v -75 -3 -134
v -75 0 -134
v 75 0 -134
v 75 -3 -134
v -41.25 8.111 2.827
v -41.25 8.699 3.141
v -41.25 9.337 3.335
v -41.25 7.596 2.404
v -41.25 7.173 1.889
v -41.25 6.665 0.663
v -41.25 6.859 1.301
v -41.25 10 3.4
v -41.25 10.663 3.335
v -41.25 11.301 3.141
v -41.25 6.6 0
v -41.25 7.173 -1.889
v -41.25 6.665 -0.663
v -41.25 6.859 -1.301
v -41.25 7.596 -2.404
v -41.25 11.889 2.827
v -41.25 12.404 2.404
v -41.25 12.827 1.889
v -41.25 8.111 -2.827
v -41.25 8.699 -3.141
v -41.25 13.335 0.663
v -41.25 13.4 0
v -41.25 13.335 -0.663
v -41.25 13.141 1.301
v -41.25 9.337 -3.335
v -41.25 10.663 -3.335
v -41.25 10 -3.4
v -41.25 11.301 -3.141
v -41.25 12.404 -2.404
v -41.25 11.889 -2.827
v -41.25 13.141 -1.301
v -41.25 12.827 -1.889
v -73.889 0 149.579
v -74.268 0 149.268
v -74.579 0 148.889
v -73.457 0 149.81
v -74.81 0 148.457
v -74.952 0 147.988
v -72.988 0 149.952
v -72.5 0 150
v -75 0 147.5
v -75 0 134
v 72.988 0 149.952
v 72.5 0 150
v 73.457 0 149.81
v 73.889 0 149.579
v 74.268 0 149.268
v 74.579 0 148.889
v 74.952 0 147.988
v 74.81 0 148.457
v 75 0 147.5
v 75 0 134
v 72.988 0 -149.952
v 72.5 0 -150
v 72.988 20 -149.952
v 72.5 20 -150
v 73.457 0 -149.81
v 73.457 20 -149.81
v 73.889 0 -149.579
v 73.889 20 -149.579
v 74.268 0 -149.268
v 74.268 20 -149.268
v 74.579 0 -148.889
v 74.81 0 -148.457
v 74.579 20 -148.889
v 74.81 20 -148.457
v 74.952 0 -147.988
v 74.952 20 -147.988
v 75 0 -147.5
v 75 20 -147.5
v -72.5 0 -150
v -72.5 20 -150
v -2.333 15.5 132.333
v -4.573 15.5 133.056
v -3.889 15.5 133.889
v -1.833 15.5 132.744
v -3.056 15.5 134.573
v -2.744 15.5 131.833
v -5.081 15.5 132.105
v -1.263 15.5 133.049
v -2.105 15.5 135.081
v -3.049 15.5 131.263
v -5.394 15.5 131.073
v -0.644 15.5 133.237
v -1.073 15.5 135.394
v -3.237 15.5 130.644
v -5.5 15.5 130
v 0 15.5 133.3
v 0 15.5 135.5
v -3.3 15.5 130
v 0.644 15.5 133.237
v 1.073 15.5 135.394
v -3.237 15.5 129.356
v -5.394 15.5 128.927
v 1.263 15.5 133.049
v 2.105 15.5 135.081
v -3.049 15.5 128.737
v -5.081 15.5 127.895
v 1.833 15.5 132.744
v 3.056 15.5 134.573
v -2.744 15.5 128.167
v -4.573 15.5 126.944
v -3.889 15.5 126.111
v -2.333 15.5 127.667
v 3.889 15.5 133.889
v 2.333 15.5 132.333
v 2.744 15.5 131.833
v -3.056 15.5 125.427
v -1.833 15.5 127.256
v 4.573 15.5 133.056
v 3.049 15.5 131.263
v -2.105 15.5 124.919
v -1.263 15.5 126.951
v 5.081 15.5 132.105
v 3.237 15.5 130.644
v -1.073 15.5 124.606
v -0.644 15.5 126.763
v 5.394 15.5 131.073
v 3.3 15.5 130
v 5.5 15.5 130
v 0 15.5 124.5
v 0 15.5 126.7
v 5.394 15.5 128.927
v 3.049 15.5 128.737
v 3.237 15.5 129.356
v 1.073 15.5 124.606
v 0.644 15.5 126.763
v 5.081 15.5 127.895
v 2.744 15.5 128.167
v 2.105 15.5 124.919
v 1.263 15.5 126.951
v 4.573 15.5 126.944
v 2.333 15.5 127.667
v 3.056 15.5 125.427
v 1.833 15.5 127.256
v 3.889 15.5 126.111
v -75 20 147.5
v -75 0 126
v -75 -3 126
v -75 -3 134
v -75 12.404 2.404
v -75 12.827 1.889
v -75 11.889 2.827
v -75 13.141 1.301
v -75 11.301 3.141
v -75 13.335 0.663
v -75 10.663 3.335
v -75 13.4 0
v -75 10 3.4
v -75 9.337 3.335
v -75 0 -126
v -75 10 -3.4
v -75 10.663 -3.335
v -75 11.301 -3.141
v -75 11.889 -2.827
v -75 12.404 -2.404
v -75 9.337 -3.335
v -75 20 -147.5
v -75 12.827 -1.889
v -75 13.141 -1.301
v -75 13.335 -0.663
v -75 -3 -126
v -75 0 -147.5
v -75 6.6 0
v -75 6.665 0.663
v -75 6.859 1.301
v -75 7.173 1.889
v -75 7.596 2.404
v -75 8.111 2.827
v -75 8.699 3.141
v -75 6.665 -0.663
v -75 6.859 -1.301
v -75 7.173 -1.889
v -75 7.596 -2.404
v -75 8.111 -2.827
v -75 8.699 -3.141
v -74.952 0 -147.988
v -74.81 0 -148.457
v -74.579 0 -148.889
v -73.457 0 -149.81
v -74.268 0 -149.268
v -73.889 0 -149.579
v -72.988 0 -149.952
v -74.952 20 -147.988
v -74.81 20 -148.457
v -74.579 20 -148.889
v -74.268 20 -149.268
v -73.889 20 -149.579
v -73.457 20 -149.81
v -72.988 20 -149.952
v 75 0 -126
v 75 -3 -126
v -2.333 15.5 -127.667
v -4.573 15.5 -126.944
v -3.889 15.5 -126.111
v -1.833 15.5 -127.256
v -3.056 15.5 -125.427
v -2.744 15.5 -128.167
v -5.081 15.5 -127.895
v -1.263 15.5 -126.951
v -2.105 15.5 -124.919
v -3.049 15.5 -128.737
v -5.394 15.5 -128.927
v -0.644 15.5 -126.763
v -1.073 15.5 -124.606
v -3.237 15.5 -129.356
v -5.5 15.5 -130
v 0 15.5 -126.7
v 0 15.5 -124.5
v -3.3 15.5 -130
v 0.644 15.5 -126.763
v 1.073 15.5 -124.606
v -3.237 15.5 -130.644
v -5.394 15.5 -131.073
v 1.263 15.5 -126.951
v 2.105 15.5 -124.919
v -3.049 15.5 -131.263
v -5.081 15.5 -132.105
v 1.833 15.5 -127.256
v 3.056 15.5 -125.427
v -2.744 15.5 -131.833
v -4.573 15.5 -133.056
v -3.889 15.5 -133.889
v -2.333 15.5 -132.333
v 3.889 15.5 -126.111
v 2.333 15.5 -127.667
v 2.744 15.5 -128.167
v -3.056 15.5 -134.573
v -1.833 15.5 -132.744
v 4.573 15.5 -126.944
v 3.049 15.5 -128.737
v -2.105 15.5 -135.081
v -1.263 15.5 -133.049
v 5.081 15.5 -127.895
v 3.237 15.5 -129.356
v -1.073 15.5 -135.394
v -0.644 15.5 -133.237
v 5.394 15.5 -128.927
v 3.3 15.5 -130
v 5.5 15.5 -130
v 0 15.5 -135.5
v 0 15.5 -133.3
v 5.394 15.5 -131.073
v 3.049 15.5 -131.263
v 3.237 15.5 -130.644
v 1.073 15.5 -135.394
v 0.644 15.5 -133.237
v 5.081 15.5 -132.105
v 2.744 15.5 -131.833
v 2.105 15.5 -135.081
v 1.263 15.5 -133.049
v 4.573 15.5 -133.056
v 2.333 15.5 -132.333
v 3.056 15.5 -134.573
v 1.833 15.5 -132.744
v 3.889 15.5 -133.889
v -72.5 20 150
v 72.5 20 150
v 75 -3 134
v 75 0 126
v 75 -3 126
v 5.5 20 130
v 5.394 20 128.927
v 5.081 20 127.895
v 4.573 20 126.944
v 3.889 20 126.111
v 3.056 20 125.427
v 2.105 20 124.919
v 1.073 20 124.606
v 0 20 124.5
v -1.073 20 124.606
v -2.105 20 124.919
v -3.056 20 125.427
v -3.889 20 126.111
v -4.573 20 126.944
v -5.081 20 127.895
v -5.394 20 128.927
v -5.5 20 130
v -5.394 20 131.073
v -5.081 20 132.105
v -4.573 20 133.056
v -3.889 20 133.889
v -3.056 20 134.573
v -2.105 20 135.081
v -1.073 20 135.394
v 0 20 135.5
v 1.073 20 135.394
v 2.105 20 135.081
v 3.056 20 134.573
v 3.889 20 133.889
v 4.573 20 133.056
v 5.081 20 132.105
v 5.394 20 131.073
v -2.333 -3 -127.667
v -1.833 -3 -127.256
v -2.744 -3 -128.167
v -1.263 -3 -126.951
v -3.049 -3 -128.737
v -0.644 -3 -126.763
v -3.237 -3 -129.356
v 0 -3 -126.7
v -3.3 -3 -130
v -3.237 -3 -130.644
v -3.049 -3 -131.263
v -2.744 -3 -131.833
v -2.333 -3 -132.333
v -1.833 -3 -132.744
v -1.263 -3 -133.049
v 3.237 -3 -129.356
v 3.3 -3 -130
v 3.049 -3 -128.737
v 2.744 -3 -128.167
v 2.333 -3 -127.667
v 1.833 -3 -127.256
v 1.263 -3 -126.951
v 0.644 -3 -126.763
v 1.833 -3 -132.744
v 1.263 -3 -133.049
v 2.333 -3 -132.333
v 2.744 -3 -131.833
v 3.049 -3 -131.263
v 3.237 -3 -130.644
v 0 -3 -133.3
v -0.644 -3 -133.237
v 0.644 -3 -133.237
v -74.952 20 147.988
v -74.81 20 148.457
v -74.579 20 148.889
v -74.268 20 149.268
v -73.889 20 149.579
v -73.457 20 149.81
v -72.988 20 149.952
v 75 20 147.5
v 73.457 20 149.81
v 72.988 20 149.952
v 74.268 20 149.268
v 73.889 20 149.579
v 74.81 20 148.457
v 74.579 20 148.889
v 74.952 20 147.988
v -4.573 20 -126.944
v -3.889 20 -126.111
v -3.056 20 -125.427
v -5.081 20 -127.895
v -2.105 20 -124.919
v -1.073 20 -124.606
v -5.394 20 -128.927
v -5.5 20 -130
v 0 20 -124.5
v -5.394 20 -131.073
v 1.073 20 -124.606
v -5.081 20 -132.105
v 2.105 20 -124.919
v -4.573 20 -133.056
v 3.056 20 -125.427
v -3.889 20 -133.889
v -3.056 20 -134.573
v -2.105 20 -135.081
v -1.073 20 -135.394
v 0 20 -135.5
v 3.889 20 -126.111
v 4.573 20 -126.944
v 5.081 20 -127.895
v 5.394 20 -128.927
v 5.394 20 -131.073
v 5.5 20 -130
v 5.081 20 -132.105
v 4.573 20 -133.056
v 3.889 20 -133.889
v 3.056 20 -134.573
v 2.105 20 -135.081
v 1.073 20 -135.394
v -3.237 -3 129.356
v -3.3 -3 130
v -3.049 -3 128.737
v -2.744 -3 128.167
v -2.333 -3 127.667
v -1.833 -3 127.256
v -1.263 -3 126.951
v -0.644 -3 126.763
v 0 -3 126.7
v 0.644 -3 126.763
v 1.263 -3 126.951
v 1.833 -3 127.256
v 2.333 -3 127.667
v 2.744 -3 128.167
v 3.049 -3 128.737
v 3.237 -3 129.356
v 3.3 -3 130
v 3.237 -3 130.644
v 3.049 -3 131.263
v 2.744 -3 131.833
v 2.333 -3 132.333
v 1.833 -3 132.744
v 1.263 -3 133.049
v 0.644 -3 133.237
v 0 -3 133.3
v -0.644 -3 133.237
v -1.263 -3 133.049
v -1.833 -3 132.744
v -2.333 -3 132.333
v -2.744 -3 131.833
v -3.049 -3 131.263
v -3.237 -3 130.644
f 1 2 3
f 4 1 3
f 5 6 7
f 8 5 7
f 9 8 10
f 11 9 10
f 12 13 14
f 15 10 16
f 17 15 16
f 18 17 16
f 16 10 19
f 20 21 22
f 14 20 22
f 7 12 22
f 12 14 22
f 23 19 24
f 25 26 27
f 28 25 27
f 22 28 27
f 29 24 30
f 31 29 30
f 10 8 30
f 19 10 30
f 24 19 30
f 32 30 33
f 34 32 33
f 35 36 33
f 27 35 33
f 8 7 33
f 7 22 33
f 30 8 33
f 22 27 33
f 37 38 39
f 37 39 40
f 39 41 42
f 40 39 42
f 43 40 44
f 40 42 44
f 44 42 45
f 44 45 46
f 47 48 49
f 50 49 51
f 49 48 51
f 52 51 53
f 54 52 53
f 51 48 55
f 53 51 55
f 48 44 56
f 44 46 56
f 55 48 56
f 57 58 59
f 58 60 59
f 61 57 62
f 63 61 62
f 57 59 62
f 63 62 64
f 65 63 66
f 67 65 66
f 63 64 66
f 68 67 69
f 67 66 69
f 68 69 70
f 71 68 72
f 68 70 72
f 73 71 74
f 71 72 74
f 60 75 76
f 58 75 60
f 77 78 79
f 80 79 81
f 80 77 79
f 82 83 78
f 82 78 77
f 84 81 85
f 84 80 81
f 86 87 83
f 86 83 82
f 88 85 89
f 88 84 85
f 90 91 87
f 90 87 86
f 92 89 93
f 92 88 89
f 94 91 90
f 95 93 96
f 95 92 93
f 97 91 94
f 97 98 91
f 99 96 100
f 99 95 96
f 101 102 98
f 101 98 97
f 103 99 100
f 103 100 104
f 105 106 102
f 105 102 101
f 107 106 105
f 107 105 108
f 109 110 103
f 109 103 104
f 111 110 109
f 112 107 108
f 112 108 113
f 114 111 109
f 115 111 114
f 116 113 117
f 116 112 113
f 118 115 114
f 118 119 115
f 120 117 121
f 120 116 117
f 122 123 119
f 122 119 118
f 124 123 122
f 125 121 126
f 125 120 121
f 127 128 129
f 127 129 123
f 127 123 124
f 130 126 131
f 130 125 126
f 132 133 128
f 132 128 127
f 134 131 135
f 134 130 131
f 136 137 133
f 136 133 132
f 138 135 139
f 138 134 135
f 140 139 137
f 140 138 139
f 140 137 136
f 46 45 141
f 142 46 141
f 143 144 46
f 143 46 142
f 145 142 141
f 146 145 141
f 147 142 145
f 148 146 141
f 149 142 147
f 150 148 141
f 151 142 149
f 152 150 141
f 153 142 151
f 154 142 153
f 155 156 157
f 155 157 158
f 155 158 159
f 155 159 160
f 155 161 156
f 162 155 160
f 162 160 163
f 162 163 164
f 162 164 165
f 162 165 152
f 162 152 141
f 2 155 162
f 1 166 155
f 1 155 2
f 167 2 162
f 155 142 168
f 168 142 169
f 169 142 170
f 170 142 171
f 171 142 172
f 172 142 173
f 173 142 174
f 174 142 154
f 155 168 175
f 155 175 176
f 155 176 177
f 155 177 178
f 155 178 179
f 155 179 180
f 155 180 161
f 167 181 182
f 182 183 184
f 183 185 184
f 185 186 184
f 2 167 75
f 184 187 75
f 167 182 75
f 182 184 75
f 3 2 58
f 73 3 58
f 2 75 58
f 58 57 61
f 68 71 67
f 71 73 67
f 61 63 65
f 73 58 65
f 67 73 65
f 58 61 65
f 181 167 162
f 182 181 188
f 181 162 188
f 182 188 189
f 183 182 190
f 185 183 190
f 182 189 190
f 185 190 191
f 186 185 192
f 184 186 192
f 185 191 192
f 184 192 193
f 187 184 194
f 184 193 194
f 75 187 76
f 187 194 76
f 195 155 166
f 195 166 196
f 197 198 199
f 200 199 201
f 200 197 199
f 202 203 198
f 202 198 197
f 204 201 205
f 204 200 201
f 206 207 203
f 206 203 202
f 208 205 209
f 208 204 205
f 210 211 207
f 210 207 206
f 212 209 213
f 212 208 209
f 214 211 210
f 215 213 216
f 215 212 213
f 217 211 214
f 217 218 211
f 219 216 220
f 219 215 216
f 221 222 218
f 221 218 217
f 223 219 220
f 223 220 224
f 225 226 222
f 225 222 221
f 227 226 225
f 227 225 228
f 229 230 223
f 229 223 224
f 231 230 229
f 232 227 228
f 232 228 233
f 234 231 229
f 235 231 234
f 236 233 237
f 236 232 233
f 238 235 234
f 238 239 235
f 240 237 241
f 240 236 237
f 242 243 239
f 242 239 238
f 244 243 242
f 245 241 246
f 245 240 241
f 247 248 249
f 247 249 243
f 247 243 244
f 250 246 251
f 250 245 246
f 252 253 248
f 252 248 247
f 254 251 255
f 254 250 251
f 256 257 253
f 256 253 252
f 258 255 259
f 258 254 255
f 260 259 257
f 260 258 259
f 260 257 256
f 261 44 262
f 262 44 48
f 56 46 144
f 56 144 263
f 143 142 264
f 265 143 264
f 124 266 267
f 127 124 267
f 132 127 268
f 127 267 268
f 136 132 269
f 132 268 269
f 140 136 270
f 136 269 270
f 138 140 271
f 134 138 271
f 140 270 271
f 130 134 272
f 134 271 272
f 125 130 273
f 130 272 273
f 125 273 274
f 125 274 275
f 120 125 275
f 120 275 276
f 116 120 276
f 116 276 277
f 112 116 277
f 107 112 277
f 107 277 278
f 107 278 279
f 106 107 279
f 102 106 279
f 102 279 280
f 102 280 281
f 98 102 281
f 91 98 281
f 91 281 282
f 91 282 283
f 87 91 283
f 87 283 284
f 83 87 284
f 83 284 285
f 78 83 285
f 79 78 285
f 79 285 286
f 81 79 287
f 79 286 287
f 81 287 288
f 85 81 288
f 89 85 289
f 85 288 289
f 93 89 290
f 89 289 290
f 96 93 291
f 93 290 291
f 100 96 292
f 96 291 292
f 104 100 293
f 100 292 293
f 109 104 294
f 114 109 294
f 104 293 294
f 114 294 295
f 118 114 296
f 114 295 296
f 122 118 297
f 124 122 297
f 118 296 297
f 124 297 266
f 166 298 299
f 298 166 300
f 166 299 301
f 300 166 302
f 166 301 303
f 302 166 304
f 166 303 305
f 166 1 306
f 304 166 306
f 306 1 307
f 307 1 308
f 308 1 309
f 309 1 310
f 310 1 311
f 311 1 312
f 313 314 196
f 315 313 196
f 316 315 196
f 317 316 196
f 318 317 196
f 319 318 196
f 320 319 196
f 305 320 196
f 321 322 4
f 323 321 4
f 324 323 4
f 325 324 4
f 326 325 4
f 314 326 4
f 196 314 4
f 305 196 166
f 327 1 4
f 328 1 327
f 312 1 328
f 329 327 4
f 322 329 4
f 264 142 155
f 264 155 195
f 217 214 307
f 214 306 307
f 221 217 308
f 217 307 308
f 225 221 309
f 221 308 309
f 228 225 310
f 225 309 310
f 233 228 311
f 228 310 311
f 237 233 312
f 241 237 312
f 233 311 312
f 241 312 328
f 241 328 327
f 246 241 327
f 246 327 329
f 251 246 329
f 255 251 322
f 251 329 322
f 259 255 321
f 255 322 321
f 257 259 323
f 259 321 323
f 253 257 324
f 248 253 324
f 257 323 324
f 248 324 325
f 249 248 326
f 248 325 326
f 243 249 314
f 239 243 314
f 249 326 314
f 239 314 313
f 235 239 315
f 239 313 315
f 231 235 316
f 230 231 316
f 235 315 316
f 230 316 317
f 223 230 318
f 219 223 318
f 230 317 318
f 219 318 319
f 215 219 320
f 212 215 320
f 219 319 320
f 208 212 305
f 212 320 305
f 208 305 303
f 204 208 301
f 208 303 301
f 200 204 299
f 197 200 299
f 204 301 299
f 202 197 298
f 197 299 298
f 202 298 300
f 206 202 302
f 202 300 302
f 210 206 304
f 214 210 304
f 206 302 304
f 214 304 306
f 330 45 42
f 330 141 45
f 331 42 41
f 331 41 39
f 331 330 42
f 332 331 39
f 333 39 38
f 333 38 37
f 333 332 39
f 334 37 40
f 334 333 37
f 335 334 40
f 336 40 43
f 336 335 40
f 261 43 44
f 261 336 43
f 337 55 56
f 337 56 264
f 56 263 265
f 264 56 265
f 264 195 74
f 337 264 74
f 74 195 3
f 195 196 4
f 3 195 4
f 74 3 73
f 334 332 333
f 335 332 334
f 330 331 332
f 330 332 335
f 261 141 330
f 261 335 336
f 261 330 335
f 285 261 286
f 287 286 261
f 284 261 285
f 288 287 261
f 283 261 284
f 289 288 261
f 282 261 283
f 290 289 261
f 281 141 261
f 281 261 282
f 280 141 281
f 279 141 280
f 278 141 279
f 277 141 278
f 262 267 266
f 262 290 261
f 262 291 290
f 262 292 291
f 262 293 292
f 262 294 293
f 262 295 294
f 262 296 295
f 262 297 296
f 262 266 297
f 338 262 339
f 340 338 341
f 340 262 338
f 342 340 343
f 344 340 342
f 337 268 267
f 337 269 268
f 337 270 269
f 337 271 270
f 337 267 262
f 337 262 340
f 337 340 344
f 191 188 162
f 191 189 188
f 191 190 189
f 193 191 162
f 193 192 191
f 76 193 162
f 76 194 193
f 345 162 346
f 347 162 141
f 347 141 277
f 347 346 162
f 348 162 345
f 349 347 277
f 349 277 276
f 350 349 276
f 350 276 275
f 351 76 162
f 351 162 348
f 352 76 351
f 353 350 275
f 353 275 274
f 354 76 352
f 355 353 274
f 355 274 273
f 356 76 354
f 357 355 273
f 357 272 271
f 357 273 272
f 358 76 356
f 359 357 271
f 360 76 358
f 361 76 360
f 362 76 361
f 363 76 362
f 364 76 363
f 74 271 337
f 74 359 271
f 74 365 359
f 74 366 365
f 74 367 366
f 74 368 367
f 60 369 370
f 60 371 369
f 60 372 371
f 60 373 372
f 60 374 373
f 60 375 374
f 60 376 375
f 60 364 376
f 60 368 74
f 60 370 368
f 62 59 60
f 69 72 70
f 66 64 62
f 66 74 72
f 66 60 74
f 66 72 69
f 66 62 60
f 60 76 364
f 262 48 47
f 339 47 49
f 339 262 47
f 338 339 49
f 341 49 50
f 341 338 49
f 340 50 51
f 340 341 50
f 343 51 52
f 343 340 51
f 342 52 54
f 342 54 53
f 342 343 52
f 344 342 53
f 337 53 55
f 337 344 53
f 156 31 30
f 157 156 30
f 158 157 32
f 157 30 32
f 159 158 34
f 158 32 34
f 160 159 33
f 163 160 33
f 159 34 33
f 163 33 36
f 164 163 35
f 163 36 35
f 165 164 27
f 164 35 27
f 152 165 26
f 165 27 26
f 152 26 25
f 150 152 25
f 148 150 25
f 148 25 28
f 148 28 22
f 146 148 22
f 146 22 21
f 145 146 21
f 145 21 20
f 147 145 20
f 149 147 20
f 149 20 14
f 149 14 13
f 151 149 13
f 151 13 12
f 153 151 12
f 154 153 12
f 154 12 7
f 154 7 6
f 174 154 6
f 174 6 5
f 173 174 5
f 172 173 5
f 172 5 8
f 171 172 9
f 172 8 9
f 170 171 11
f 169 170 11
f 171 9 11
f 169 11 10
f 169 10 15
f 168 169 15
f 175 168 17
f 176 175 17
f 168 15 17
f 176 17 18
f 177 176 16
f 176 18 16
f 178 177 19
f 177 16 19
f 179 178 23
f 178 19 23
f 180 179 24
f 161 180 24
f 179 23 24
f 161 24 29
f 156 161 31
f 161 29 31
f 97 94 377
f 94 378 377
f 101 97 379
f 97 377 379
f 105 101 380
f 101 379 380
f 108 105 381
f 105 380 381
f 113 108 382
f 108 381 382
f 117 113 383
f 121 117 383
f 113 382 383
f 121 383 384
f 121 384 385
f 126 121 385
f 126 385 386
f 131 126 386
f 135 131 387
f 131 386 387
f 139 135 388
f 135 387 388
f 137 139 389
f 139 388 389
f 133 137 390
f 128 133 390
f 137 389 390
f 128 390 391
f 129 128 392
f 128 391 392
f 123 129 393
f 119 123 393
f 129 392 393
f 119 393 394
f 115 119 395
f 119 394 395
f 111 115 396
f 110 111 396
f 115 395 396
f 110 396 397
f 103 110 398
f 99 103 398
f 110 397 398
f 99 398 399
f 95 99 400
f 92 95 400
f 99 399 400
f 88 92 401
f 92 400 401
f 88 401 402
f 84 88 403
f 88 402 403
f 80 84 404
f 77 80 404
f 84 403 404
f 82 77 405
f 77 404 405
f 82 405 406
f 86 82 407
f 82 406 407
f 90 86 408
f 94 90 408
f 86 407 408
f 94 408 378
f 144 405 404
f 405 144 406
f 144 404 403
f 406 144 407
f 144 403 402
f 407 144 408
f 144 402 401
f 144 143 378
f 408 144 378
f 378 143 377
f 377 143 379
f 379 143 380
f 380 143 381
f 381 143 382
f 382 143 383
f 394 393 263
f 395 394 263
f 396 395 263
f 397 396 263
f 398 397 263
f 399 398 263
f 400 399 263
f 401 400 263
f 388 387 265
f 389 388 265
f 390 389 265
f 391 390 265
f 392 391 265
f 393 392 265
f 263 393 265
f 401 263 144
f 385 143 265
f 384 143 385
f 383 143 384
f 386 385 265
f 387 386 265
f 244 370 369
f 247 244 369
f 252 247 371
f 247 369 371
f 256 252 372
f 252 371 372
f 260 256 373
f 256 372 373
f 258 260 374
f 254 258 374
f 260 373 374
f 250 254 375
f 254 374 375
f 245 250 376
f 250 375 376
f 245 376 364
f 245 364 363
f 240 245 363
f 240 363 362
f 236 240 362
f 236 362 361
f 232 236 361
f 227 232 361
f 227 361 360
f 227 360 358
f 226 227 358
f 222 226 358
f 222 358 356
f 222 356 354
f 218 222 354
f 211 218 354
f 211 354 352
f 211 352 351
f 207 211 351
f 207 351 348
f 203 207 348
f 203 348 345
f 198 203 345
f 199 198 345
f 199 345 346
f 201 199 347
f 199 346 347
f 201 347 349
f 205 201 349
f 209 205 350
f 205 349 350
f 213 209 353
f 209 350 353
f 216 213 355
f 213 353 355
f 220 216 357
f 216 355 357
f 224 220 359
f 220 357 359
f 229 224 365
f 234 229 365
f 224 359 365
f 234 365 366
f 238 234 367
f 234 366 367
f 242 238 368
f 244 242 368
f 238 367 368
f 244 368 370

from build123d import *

# Parameters (mm, degrees)
SKETCH1_W                                            = 150
SKETCH1_H                                            = 300
BOSS_EXTRUDE1_DEPTH                                  = 20
SKETCH2_W                                            = 150
SKETCH2_H                                            = 8
BOSS_EXTRUDE2_DEPTH                                  = 3
CBORE_FOR_M6_HEX_SOCKET_THIN_HEAD_CAP_SC_D           = 6.6
CBORE_FOR_M6_HEX_SOCKET_THIN_HEAD_CAP_SC_DEPTH       = 24.5
CBORE_FOR_M6_HEX_SOCKET_THIN_HEAD_CAP_SC_CBORE_D     = 11
CBORE_FOR_M6_HEX_SOCKET_THIN_HEAD_CAP_SC_CBORE_DEPTH = 4.5
M8_TAPPED_HOLE1_D                                    = 6.8
M8_TAPPED_HOLE1_DEPTH                                = 33.75
FILLET1_R                                            = 2.5


with BuildPart() as part:
    # Sketch1 → Boss-Extrude1 (new body)
    with BuildSketch(Plane(origin=(0, 0, 0), x_dir=(1, 0, 0), z_dir=(0, 1, 0))):
        Rectangle(SKETCH1_W, SKETCH1_H)
    extrude(amount=BOSS_EXTRUDE1_DEPTH)

    # Sketch2 → Boss-Extrude2 (add)
    with BuildSketch(Plane(origin=(0, 0, 0), x_dir=(1, 0, 0), z_dir=(0, 1, 0))):
        with Locations((0, -130)):
            Rectangle(SKETCH2_W, SKETCH2_H)
        with Locations((0, 130)):
            Rectangle(SKETCH2_W, SKETCH2_H)
    extrude(amount=-BOSS_EXTRUDE2_DEPTH)

    # CBORE for M6 Hex Socket Thin Head Cap Screw1
    with Locations(Plane(origin=(0, 20, 0), x_dir=(1, 0, 0), z_dir=(0, 1, 0))):
        with Locations((0, -130), (0, 130)):
            CounterBoreHole(CBORE_FOR_M6_HEX_SOCKET_THIN_HEAD_CAP_SC_D / 2, CBORE_FOR_M6_HEX_SOCKET_THIN_HEAD_CAP_SC_CBORE_D / 2, CBORE_FOR_M6_HEX_SOCKET_THIN_HEAD_CAP_SC_CBORE_DEPTH, depth=CBORE_FOR_M6_HEX_SOCKET_THIN_HEAD_CAP_SC_DEPTH)

    # M8 Tapped Hole1
    with Locations(Plane.ZY.offset(75)):
        with Locations((0, 10)):
            Hole(M8_TAPPED_HOLE1_D / 2, depth=M8_TAPPED_HOLE1_DEPTH)

    # Fillet1
    fillet1_edges = [part.edges().sort_by_distance(p)[0] for p in [
        (-75, 10, -150),
        (75, 10, -150),
        (75, 10, 150),
        (-75, 10, 150),
    ]]
    fillet(fillet1_edges, radius=FILLET1_R)


solid = part.part
